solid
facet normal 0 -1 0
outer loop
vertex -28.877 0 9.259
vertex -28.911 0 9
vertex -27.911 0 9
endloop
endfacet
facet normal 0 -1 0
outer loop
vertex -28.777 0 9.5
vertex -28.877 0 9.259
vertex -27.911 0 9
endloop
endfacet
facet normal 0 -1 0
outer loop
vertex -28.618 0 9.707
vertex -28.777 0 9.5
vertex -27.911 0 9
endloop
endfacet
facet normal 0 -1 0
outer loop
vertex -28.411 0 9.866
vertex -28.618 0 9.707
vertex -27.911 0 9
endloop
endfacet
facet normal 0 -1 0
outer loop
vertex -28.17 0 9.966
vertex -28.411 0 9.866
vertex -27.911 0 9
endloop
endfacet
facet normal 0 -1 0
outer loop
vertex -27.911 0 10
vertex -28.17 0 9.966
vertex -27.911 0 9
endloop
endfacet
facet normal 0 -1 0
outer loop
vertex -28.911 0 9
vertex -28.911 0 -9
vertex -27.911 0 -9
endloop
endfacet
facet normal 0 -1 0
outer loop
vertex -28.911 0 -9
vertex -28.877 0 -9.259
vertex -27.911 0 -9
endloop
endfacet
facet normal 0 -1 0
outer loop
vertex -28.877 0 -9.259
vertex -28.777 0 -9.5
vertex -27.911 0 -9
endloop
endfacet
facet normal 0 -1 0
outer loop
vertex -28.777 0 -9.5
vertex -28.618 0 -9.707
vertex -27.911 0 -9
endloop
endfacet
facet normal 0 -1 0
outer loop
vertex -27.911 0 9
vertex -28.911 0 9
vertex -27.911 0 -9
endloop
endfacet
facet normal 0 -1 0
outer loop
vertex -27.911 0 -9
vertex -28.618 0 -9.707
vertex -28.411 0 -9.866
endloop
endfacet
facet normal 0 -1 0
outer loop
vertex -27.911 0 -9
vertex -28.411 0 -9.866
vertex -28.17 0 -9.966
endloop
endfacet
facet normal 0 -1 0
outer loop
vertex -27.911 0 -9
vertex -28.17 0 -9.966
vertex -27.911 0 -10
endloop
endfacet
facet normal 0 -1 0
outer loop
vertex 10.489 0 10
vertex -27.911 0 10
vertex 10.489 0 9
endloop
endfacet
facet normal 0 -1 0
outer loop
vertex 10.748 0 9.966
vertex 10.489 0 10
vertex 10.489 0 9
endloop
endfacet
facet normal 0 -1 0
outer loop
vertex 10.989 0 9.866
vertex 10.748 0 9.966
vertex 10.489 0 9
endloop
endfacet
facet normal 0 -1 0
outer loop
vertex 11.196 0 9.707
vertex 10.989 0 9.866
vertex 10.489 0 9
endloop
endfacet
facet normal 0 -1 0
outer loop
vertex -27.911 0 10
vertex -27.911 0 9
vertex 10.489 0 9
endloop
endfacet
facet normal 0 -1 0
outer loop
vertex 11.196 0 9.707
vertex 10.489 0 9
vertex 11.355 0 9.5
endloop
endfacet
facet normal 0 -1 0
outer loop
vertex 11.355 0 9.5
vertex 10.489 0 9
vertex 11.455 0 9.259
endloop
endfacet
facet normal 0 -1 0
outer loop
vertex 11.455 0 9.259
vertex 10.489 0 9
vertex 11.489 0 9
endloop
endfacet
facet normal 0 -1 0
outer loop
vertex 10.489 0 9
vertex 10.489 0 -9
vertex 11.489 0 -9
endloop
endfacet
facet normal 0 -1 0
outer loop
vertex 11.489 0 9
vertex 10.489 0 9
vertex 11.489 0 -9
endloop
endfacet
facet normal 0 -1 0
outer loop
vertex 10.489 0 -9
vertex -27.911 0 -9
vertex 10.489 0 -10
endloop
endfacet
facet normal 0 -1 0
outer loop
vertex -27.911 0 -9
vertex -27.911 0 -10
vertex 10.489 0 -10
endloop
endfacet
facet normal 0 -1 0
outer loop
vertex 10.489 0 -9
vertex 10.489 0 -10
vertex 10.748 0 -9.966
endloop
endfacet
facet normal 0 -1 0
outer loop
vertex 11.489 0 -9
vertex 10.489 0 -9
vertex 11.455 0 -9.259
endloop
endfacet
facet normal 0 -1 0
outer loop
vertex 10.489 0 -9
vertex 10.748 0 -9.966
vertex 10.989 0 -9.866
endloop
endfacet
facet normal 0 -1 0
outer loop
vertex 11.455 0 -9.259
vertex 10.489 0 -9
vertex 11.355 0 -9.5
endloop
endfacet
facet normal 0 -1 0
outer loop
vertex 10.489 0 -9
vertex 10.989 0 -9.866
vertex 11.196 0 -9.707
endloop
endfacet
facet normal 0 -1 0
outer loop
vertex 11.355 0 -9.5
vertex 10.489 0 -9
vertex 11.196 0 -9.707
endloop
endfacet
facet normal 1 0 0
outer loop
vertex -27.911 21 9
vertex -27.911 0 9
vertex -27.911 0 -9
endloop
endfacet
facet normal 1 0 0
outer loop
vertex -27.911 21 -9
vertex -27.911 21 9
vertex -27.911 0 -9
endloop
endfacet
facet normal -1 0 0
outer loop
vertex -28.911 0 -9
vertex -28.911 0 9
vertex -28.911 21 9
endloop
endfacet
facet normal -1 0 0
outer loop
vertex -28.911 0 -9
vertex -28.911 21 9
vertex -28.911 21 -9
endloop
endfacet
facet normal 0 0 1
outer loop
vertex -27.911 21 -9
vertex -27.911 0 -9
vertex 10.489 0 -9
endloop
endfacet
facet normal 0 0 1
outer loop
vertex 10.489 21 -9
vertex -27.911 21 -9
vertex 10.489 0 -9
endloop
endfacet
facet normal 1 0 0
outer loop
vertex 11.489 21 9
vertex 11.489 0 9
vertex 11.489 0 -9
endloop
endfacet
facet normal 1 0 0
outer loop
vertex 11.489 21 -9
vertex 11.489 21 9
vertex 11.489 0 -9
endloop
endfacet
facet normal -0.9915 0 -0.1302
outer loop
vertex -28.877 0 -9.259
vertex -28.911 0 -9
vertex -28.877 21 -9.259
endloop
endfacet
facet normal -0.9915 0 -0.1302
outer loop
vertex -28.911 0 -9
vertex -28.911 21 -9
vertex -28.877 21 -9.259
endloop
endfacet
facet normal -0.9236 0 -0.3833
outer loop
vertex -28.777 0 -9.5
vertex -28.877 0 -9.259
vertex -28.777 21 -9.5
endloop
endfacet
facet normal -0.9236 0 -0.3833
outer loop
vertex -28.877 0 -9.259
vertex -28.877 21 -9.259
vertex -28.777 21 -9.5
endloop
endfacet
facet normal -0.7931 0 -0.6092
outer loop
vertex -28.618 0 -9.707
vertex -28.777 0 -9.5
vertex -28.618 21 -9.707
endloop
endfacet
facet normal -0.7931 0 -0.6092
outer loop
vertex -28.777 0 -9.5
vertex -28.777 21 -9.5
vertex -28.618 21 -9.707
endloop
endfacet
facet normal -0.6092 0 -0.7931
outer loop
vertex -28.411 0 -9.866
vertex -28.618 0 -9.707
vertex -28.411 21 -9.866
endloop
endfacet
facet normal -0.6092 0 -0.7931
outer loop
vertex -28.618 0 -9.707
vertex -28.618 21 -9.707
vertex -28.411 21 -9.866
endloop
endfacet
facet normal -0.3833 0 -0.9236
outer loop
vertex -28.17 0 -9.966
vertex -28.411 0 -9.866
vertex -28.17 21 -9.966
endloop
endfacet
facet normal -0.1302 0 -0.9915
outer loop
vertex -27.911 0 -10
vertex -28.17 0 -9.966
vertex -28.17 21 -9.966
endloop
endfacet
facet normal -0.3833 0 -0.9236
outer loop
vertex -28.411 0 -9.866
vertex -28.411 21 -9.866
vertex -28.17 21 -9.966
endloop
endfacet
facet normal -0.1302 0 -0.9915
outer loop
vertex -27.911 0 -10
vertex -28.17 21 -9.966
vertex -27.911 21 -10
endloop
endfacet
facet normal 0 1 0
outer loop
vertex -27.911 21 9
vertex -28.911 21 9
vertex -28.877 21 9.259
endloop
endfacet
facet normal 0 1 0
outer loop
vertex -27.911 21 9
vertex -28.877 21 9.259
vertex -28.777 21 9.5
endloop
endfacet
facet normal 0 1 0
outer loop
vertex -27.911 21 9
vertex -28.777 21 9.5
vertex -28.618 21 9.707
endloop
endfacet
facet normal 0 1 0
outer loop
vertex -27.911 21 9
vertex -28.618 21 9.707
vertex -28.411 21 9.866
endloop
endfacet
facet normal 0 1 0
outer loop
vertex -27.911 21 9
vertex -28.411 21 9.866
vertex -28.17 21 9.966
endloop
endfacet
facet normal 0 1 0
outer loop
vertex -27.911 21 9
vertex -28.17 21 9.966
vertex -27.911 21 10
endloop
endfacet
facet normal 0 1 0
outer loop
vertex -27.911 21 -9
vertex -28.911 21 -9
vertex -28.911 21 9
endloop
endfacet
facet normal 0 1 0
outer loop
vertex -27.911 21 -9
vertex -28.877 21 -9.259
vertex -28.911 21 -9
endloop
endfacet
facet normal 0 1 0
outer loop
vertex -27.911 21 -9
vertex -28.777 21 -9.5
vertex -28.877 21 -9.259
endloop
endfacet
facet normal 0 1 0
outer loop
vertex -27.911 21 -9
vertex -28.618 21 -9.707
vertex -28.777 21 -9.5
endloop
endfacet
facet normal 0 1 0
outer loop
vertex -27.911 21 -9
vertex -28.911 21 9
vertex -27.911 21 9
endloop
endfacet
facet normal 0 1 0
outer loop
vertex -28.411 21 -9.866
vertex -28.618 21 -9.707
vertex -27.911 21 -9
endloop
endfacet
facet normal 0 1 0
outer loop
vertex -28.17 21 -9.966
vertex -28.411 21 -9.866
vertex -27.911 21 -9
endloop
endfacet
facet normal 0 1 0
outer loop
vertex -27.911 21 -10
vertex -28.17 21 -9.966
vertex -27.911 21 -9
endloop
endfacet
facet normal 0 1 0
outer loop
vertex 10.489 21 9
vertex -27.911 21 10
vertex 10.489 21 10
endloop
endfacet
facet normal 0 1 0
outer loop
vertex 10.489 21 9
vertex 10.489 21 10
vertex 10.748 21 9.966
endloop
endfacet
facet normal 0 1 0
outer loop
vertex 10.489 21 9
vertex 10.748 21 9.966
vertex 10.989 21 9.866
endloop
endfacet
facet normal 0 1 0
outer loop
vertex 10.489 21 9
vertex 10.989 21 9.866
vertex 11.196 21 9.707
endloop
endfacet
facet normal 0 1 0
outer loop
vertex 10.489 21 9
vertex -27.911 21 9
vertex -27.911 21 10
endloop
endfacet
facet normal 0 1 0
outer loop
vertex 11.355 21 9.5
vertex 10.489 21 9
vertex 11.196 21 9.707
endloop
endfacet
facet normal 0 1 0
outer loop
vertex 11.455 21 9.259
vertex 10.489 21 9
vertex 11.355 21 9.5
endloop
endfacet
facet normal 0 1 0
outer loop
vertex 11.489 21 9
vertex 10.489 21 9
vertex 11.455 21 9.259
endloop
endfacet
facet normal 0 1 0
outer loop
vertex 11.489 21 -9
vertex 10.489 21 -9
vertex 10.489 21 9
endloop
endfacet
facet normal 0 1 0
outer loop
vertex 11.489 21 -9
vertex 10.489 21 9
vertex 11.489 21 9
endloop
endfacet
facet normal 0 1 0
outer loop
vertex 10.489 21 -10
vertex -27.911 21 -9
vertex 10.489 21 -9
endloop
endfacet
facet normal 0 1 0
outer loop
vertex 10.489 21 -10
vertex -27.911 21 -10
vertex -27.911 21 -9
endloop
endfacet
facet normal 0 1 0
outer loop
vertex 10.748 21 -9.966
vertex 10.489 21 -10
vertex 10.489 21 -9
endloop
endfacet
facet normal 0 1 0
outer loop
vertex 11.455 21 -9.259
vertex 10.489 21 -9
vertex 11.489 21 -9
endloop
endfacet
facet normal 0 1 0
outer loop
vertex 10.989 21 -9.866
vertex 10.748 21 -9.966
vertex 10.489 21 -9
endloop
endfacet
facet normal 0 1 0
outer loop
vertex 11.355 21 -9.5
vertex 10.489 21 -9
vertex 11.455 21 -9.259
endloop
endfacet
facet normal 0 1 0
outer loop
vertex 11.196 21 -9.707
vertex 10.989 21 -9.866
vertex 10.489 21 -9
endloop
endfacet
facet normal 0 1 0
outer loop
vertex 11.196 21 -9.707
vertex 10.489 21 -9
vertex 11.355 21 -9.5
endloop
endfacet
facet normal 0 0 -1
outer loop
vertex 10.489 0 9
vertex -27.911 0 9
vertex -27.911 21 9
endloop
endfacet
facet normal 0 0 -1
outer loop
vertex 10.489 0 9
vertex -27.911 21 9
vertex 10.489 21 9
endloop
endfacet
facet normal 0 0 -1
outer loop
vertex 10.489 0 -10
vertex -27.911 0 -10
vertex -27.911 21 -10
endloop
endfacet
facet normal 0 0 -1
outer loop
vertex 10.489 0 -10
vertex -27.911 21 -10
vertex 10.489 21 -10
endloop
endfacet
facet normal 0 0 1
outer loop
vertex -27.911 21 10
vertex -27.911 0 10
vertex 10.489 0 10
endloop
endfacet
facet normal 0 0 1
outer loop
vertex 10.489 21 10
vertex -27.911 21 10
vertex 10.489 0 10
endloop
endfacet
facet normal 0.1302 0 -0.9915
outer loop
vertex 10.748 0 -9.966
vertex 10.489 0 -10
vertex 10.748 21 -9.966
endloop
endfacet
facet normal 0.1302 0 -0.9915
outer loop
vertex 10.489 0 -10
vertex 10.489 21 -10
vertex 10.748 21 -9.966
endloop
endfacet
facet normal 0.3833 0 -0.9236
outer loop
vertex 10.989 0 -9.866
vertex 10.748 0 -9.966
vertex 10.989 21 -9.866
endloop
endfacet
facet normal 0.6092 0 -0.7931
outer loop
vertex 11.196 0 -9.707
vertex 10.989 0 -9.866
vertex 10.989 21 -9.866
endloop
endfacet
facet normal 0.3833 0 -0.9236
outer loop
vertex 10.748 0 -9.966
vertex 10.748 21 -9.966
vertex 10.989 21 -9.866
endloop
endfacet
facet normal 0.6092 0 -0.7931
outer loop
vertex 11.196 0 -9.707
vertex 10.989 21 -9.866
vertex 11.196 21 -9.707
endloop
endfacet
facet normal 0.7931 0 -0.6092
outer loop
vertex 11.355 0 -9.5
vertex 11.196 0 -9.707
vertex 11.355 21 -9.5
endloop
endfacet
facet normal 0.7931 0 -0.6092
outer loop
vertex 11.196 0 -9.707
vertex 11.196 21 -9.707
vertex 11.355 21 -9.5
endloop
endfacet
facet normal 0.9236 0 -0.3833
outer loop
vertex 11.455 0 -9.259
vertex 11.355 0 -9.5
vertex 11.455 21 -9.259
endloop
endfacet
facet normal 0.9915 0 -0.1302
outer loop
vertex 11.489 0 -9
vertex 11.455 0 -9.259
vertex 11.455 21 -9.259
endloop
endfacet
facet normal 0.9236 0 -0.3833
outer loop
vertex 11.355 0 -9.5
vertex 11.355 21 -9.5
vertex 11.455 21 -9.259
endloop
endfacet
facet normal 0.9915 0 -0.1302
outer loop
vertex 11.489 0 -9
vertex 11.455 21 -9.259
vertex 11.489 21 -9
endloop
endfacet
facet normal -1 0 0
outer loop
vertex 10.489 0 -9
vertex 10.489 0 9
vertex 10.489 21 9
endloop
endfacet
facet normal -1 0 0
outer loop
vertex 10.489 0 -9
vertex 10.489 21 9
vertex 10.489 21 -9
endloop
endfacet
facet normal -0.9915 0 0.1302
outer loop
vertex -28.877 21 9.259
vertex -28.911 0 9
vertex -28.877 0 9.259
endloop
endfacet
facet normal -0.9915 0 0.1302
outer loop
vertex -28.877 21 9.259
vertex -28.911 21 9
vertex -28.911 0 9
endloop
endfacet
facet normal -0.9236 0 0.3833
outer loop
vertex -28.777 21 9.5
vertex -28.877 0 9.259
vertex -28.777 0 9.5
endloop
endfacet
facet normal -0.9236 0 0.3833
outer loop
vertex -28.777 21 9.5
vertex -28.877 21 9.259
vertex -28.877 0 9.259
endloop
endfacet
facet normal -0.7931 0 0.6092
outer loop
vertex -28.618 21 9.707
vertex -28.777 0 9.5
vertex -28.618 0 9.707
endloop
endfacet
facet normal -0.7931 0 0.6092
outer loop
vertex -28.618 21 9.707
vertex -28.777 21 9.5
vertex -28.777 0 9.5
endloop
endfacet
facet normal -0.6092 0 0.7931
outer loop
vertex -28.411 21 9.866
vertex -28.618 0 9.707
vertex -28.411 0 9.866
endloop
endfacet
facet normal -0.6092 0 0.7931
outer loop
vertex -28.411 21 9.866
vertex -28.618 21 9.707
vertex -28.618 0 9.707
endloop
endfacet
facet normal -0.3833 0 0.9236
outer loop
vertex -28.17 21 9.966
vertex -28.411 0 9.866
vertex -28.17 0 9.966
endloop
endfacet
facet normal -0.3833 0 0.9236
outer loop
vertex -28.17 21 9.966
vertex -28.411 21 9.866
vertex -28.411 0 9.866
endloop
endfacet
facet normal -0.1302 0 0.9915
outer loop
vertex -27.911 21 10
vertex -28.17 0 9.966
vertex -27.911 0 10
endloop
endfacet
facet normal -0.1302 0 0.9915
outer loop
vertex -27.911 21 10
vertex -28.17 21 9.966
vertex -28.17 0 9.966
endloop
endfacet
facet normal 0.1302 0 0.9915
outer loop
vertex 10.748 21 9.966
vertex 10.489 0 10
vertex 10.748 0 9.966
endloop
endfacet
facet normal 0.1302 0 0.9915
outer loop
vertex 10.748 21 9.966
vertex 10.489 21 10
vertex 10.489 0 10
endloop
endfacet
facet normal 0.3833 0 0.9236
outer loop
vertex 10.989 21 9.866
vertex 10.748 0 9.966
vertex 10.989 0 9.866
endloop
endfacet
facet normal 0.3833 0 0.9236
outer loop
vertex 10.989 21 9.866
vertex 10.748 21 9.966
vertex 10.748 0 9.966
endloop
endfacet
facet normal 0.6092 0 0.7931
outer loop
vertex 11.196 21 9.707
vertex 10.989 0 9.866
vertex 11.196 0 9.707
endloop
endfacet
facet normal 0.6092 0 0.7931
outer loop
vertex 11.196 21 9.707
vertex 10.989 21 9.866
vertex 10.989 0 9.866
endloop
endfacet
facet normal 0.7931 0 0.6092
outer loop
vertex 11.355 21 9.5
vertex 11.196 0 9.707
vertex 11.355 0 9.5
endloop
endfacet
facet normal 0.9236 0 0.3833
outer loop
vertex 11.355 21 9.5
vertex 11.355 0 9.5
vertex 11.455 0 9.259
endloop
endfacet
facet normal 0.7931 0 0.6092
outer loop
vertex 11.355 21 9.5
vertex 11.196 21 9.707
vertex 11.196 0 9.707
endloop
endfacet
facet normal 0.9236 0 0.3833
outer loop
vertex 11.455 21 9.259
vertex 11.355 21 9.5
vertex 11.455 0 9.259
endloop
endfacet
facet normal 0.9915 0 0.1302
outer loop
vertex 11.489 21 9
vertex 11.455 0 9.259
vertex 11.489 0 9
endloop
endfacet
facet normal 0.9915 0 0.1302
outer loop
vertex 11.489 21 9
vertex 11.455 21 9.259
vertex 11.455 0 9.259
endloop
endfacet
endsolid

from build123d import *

# Parameters (mm, degrees)
ESQUISSE1_W        = 40.4
ESQUISSE1_H        = 20
ESQUISSE1_W_2      = 38.4
ESQUISSE1_H_2      = 18
BOSS_EXTRU_1_DEPTH = 21
CONG_1_R           = 1


with BuildPart() as part:
    # Esquisse1 → Boss.-Extru.1 (new body)
    with BuildSketch(Plane(origin=(0, 0, 0), x_dir=(1, 0, 0), z_dir=(0, 1, 0))):
        with Locations((-8.710891089, 0)):
            Rectangle(ESQUISSE1_W, ESQUISSE1_H)
        with Locations((-8.710891089, 0)):
            Rectangle(ESQUISSE1_W_2, ESQUISSE1_H_2, mode=Mode.SUBTRACT)
    extrude(amount=BOSS_EXTRU_1_DEPTH)

    # Congé1
    cong_1_edges = [part.edges().sort_by_distance(p)[0] for p in [
        (-28.910891089, 10.5, -10),
        (11.489108911, 10.5, -10),
        (11.489108911, 10.5, 10),
        (-28.910891089, 10.5, 10),
    ]]
    fillet(cong_1_edges, radius=CONG_1_R)


solid = part.part
